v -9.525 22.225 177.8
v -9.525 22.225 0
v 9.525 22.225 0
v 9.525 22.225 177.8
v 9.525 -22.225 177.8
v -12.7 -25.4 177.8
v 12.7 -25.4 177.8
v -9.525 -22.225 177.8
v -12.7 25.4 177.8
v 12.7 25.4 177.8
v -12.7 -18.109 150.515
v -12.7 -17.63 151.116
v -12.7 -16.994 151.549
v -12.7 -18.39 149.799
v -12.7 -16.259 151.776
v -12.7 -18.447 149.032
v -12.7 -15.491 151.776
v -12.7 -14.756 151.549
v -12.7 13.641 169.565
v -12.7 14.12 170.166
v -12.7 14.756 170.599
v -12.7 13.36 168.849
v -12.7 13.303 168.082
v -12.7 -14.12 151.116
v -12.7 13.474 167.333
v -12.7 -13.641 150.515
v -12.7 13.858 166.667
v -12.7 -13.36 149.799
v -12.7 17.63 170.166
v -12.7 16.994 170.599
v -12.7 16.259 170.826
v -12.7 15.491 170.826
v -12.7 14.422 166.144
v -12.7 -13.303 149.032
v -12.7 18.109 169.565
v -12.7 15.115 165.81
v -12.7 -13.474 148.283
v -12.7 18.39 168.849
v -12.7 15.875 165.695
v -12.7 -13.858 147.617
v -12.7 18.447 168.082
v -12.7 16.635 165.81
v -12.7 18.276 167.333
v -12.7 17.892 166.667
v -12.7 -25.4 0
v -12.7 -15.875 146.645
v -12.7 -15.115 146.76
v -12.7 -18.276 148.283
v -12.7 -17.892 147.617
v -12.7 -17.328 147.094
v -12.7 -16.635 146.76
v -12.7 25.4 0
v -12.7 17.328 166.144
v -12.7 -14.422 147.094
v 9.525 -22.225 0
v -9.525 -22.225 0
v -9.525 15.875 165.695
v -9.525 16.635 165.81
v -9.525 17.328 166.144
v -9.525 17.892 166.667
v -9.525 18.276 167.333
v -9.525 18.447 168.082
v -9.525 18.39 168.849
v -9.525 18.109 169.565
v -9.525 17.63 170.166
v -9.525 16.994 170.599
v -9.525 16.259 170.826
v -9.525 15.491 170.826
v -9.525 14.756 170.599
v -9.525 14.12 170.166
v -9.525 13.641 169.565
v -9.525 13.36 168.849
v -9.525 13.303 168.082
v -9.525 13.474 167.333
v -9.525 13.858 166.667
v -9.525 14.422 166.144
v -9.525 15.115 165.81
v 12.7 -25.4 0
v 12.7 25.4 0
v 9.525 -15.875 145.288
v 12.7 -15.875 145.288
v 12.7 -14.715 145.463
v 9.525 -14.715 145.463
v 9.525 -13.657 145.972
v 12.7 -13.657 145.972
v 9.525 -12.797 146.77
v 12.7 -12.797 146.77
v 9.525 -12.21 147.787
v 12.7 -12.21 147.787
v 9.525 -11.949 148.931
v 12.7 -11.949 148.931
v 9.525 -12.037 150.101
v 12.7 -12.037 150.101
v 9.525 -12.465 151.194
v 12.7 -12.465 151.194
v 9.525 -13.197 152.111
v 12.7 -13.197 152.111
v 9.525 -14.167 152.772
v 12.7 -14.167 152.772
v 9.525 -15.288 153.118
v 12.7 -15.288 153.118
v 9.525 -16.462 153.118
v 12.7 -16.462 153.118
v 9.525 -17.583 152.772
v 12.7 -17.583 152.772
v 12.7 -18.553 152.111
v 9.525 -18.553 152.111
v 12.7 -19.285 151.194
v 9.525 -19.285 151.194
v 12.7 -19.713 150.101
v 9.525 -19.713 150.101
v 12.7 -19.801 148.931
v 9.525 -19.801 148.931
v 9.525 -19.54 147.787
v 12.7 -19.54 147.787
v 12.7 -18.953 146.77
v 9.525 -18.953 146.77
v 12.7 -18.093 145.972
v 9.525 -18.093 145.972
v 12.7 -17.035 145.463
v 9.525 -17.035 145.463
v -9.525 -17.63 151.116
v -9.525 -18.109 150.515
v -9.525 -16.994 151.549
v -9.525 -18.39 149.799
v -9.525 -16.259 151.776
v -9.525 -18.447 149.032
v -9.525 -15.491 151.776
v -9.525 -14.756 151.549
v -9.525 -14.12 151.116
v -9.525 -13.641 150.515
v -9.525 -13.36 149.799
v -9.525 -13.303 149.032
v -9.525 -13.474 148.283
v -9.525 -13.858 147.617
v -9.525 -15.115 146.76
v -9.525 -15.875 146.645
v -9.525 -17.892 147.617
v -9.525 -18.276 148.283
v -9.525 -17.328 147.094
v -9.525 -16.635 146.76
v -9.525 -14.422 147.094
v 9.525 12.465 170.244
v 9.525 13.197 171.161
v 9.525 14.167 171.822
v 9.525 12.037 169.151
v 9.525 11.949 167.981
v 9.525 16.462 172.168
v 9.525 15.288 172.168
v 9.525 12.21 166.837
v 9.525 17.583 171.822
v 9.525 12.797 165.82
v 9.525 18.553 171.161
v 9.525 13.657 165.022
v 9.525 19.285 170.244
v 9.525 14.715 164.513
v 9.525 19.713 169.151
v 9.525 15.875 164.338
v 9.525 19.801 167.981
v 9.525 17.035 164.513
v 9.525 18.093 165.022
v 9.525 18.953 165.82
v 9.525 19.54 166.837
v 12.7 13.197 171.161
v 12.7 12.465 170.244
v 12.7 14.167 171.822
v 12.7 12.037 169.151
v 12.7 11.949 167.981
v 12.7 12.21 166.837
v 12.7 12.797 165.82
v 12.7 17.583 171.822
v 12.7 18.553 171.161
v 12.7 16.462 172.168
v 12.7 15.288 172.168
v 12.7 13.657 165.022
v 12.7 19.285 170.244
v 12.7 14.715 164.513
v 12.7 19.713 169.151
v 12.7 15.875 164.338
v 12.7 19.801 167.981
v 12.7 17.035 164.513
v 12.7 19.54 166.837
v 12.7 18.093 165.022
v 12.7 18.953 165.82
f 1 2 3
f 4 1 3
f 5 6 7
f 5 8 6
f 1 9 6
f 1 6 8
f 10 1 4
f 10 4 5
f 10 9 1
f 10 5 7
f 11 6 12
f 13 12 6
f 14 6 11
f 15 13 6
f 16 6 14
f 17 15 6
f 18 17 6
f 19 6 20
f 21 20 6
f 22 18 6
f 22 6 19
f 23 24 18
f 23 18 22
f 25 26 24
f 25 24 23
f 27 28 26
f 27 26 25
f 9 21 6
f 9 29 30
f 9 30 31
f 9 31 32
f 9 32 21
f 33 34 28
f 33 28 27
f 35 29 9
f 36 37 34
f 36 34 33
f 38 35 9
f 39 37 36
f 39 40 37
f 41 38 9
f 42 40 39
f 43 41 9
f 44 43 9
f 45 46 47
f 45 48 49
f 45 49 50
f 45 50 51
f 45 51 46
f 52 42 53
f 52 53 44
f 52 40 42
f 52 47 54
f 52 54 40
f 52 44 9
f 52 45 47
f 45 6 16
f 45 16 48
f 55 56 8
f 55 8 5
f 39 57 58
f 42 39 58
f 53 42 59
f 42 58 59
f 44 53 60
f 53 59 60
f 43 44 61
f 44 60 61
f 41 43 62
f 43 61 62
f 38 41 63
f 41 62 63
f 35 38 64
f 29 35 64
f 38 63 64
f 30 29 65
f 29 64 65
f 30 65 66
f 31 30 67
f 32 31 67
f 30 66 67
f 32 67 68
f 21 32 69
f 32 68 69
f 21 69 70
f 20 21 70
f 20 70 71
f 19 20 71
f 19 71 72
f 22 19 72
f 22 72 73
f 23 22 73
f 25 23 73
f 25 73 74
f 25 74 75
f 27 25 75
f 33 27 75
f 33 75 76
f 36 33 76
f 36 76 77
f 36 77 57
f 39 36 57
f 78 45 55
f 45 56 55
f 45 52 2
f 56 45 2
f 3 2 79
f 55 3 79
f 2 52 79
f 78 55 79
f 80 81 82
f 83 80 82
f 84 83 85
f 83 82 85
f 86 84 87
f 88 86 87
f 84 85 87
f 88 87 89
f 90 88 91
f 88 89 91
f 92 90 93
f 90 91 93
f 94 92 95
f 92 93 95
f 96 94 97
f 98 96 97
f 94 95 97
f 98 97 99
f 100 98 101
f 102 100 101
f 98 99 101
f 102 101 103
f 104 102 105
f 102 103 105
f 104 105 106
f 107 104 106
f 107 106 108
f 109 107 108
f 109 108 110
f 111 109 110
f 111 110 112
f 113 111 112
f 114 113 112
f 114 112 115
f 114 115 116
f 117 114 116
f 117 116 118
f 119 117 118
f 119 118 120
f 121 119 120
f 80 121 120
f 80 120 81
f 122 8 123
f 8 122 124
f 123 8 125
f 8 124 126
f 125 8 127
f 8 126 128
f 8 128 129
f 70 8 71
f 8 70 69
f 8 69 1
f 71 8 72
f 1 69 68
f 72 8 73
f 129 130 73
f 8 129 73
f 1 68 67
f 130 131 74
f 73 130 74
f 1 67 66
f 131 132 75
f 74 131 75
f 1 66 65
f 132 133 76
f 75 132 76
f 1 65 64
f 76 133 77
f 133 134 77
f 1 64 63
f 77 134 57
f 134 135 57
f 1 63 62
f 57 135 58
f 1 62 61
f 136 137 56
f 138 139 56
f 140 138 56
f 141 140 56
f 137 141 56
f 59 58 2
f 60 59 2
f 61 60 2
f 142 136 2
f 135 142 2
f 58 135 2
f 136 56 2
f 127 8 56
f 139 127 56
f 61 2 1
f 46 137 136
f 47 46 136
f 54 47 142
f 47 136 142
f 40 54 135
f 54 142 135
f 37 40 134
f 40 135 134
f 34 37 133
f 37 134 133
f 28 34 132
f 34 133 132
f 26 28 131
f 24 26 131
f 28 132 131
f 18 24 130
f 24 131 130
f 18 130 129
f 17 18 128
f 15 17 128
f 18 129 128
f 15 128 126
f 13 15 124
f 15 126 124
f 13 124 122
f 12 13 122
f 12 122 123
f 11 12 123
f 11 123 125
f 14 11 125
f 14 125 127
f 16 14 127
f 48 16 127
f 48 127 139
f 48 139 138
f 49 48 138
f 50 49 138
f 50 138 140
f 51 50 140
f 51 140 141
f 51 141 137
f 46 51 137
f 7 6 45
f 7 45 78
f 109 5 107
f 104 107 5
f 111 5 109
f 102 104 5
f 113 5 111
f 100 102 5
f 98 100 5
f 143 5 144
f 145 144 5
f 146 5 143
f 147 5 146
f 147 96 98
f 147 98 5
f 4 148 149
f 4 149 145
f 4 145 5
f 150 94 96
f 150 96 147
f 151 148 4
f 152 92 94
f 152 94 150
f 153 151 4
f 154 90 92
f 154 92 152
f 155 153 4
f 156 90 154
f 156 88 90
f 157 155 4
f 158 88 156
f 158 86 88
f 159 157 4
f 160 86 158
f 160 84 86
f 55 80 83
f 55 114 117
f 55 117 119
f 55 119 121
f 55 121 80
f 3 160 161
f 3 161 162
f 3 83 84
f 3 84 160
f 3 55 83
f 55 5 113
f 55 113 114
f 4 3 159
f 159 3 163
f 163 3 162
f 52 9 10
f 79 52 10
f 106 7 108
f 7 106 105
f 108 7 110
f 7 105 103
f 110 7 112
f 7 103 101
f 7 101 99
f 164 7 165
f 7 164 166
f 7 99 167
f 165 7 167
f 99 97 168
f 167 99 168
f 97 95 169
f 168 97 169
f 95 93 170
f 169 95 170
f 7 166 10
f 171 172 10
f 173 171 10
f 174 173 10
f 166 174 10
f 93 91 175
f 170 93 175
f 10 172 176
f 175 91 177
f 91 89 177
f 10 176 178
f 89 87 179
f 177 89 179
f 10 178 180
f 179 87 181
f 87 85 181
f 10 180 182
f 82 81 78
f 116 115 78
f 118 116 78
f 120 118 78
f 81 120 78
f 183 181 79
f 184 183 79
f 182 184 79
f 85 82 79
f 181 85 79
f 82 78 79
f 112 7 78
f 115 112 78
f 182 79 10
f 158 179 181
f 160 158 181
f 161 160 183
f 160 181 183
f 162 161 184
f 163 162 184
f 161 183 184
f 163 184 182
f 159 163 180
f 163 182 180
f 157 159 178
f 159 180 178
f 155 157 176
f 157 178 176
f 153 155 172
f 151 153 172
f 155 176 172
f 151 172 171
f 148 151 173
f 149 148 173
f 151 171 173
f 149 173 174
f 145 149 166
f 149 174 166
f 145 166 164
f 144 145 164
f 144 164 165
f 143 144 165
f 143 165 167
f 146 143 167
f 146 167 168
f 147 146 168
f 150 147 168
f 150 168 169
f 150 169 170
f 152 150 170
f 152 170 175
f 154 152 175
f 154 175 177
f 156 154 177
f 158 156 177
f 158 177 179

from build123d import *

# Parameters (mm, degrees)
SKETCH1_W           = 25.4
SKETCH1_H           = 50.8
SKETCH1_W_2         = 19.05
SKETCH1_H_2         = 44.45
BOSS_EXTRUDE1_DEPTH = 177.8
SKETCH2_R           = 2.5796875
CUT_EXTRUDE1_DEPTH  = 182.392282085
CUT_EXTRUDE2_REACH  = 183.392
SKETCH3_R           = 3.937


with BuildPart() as part:
    # Sketch1 → Boss-Extrude1 (new body)
    with BuildSketch(Plane.XY):
        Rectangle(SKETCH1_W, SKETCH1_H)
        Rectangle(SKETCH1_W_2, SKETCH1_H_2, mode=Mode.SUBTRACT)
    extrude(amount=BOSS_EXTRUDE1_DEPTH)

    # Sketch2 → Cut-Extrude1 (cut, through all)
    with BuildSketch(Plane(origin=(12.7, 0, 0), x_dir=(0, 0, -1), z_dir=(1, 0, 0))):
        with Locations((-168.275, 15.875)):
            Circle(SKETCH2_R)
        with Locations((-149.225, -15.875)):
            Circle(SKETCH2_R)
    extrude(amount=-CUT_EXTRUDE1_DEPTH, mode=Mode.SUBTRACT)

    # Sketch3 → Cut-Extrude2 (cut, up to next)
    with BuildSketch(Plane(origin=(12.7, 0, 0), x_dir=(0, 0, -1), z_dir=(1, 0, 0)), mode=Mode.PRIVATE) as cut_extrude2_sk1:
        with Locations((-168.275, 15.875)):
            Circle(SKETCH3_R)
    cut_extrude2_tool1 = extrude(cut_extrude2_sk1.sketch, amount=-CUT_EXTRUDE2_REACH, mode=Mode.PRIVATE) & part.part
    # Sketch3 → Cut-Extrude2 (cut, up to next)
    with BuildSketch(Plane(origin=(12.7, 0, 0), x_dir=(0, 0, -1), z_dir=(1, 0, 0)), mode=Mode.PRIVATE) as cut_extrude2_sk2:
        with Locations((-149.225, -15.875)):
            Circle(SKETCH3_R)
    cut_extrude2_tool2 = extrude(cut_extrude2_sk2.sketch, amount=-CUT_EXTRUDE2_REACH, mode=Mode.PRIVATE) & part.part
    add(cut_extrude2_tool1.solids().sort_by_distance((12.7, 15.875, 168.275))[0], mode=Mode.SUBTRACT)
    add(cut_extrude2_tool2.solids().sort_by_distance((12.7, -15.875, 149.225))[0], mode=Mode.SUBTRACT)


solid = part.part
